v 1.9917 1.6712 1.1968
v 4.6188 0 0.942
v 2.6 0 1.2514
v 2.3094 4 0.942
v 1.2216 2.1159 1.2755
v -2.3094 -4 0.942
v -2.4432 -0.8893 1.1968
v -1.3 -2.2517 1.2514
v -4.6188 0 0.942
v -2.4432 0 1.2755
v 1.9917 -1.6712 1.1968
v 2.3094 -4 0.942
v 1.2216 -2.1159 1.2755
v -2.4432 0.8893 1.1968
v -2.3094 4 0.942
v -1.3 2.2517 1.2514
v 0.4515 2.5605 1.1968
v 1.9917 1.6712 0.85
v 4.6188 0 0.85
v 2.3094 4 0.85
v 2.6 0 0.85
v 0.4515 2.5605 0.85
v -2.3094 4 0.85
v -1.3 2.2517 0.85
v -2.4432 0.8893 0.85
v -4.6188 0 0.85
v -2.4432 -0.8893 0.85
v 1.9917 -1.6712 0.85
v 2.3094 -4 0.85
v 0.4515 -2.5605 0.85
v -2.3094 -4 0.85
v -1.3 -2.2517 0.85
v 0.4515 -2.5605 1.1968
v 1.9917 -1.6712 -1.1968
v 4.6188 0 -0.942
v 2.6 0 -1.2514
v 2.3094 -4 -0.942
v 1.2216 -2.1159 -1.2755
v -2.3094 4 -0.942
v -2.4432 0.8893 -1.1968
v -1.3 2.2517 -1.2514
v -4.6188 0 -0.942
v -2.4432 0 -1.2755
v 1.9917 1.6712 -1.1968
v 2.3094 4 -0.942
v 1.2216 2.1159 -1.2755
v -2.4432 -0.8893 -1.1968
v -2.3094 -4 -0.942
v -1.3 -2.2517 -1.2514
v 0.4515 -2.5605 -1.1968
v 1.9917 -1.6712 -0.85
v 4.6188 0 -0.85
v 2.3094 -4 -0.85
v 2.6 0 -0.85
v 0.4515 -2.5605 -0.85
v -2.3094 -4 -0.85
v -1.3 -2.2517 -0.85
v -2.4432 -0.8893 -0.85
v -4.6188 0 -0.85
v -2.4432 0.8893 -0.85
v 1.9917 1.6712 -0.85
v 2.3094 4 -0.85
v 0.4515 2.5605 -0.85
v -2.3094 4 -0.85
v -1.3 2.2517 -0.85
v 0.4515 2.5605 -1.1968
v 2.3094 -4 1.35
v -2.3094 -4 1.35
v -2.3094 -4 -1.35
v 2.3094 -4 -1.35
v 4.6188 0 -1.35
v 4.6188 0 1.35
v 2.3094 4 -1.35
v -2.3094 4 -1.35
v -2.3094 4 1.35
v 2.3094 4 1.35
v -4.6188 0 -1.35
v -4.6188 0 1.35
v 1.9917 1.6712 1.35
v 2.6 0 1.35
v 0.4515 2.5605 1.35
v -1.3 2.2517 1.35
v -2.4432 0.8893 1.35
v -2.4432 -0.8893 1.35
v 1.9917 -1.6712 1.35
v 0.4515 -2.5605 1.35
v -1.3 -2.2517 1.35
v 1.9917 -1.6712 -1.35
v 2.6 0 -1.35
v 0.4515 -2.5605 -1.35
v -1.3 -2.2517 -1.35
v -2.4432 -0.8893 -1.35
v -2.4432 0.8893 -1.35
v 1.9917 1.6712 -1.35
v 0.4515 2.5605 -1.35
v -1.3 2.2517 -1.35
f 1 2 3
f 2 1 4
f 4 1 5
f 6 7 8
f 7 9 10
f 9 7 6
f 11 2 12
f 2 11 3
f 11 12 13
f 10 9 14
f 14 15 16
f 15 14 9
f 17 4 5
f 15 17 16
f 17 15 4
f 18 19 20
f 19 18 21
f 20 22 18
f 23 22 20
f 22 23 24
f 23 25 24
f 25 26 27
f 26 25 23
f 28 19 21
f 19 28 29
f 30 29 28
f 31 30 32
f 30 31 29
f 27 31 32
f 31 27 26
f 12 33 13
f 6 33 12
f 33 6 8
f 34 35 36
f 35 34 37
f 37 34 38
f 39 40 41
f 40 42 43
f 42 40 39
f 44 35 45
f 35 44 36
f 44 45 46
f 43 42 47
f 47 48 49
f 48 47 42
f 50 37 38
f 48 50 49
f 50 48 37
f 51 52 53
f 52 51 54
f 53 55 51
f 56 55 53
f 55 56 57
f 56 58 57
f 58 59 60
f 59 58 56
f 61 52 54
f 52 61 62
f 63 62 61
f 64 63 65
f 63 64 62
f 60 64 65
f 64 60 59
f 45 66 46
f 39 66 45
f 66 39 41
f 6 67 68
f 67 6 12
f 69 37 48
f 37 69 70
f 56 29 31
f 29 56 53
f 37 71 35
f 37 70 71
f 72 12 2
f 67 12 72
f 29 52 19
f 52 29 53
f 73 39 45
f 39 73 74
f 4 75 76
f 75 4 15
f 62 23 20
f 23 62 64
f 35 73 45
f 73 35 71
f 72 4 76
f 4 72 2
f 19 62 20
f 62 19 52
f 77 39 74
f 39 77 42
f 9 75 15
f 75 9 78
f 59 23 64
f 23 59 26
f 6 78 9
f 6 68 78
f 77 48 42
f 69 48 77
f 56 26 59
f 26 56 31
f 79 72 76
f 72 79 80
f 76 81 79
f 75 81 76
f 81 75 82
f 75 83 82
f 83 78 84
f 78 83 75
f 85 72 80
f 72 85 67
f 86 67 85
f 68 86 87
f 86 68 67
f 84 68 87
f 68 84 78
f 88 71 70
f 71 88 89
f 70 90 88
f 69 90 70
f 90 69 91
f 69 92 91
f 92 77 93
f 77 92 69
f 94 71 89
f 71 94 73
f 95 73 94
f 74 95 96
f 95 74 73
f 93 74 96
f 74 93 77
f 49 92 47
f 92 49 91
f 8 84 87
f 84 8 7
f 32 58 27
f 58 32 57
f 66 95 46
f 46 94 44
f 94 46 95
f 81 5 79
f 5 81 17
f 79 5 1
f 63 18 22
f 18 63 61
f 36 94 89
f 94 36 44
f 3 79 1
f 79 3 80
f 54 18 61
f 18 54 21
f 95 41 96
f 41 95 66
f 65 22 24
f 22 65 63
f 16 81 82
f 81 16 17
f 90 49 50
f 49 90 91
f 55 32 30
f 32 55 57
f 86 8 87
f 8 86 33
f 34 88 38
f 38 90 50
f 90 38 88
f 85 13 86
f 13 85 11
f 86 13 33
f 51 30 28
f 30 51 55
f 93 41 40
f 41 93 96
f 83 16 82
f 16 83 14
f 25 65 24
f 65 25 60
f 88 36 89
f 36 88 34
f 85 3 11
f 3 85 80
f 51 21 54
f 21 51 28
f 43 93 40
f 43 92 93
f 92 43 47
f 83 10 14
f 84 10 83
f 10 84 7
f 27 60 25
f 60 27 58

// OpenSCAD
// Parameters
thread_nominal_diameter = 5; //[2.5:10:0.1]
across_flats = 8; //[4:16:0.1]
thickness = 2.7; //[1.35:5.4:0.05]
thread_pitch = 0.8; //[0.35:1.6:0.05]
clearance_hole_diameter = 5.2; //[4.5:6.5:0.05]
thread_tap_drill_diameter = 4.2; //[3.2:5.0:0.05]
hole_mode = 0; //[0:1:1]
chamfer_size = 0.2; //[0.1:0.6:0.05]
eps = 0.6; //[0.2:1.5:0.1]

// Hex Nut with Chamfers and Central Hole
module nut_and_washer() {
  difference() {
    // Hex Nut Body
    color("DimGray") {
      cylinder(r=(across_flats/2)/cos(30), h=thickness, center=true, $fn=6);
    }
    // Top and Bottom Chamfers
    union() {
      translate([0, 0, thickness/2 - (chamfer_size+eps)/2 + eps/2])
        cylinder(r1=(across_flats/2)/cos(30) + eps, r2=0, h=chamfer_size + eps, center=true, $fn=6);
      translate([0, 0, -thickness/2 + (chamfer_size+eps)/2 - eps/2])
        rotate([180, 0, 0])
        cylinder(r1=(across_flats/2)/cos(30) + eps, r2=0, h=chamfer_size + eps, center=true, $fn=6);
    }
    // Central Thread Hole
    cylinder(r=((1-hole_mode)*clearance_hole_diameter + hole_mode*thread_tap_drill_diameter)/2, h=thickness + 2*eps, center=true);
  }
}

// Assembly
module assembly() {
  nut_and_washer();
}

assembly();
